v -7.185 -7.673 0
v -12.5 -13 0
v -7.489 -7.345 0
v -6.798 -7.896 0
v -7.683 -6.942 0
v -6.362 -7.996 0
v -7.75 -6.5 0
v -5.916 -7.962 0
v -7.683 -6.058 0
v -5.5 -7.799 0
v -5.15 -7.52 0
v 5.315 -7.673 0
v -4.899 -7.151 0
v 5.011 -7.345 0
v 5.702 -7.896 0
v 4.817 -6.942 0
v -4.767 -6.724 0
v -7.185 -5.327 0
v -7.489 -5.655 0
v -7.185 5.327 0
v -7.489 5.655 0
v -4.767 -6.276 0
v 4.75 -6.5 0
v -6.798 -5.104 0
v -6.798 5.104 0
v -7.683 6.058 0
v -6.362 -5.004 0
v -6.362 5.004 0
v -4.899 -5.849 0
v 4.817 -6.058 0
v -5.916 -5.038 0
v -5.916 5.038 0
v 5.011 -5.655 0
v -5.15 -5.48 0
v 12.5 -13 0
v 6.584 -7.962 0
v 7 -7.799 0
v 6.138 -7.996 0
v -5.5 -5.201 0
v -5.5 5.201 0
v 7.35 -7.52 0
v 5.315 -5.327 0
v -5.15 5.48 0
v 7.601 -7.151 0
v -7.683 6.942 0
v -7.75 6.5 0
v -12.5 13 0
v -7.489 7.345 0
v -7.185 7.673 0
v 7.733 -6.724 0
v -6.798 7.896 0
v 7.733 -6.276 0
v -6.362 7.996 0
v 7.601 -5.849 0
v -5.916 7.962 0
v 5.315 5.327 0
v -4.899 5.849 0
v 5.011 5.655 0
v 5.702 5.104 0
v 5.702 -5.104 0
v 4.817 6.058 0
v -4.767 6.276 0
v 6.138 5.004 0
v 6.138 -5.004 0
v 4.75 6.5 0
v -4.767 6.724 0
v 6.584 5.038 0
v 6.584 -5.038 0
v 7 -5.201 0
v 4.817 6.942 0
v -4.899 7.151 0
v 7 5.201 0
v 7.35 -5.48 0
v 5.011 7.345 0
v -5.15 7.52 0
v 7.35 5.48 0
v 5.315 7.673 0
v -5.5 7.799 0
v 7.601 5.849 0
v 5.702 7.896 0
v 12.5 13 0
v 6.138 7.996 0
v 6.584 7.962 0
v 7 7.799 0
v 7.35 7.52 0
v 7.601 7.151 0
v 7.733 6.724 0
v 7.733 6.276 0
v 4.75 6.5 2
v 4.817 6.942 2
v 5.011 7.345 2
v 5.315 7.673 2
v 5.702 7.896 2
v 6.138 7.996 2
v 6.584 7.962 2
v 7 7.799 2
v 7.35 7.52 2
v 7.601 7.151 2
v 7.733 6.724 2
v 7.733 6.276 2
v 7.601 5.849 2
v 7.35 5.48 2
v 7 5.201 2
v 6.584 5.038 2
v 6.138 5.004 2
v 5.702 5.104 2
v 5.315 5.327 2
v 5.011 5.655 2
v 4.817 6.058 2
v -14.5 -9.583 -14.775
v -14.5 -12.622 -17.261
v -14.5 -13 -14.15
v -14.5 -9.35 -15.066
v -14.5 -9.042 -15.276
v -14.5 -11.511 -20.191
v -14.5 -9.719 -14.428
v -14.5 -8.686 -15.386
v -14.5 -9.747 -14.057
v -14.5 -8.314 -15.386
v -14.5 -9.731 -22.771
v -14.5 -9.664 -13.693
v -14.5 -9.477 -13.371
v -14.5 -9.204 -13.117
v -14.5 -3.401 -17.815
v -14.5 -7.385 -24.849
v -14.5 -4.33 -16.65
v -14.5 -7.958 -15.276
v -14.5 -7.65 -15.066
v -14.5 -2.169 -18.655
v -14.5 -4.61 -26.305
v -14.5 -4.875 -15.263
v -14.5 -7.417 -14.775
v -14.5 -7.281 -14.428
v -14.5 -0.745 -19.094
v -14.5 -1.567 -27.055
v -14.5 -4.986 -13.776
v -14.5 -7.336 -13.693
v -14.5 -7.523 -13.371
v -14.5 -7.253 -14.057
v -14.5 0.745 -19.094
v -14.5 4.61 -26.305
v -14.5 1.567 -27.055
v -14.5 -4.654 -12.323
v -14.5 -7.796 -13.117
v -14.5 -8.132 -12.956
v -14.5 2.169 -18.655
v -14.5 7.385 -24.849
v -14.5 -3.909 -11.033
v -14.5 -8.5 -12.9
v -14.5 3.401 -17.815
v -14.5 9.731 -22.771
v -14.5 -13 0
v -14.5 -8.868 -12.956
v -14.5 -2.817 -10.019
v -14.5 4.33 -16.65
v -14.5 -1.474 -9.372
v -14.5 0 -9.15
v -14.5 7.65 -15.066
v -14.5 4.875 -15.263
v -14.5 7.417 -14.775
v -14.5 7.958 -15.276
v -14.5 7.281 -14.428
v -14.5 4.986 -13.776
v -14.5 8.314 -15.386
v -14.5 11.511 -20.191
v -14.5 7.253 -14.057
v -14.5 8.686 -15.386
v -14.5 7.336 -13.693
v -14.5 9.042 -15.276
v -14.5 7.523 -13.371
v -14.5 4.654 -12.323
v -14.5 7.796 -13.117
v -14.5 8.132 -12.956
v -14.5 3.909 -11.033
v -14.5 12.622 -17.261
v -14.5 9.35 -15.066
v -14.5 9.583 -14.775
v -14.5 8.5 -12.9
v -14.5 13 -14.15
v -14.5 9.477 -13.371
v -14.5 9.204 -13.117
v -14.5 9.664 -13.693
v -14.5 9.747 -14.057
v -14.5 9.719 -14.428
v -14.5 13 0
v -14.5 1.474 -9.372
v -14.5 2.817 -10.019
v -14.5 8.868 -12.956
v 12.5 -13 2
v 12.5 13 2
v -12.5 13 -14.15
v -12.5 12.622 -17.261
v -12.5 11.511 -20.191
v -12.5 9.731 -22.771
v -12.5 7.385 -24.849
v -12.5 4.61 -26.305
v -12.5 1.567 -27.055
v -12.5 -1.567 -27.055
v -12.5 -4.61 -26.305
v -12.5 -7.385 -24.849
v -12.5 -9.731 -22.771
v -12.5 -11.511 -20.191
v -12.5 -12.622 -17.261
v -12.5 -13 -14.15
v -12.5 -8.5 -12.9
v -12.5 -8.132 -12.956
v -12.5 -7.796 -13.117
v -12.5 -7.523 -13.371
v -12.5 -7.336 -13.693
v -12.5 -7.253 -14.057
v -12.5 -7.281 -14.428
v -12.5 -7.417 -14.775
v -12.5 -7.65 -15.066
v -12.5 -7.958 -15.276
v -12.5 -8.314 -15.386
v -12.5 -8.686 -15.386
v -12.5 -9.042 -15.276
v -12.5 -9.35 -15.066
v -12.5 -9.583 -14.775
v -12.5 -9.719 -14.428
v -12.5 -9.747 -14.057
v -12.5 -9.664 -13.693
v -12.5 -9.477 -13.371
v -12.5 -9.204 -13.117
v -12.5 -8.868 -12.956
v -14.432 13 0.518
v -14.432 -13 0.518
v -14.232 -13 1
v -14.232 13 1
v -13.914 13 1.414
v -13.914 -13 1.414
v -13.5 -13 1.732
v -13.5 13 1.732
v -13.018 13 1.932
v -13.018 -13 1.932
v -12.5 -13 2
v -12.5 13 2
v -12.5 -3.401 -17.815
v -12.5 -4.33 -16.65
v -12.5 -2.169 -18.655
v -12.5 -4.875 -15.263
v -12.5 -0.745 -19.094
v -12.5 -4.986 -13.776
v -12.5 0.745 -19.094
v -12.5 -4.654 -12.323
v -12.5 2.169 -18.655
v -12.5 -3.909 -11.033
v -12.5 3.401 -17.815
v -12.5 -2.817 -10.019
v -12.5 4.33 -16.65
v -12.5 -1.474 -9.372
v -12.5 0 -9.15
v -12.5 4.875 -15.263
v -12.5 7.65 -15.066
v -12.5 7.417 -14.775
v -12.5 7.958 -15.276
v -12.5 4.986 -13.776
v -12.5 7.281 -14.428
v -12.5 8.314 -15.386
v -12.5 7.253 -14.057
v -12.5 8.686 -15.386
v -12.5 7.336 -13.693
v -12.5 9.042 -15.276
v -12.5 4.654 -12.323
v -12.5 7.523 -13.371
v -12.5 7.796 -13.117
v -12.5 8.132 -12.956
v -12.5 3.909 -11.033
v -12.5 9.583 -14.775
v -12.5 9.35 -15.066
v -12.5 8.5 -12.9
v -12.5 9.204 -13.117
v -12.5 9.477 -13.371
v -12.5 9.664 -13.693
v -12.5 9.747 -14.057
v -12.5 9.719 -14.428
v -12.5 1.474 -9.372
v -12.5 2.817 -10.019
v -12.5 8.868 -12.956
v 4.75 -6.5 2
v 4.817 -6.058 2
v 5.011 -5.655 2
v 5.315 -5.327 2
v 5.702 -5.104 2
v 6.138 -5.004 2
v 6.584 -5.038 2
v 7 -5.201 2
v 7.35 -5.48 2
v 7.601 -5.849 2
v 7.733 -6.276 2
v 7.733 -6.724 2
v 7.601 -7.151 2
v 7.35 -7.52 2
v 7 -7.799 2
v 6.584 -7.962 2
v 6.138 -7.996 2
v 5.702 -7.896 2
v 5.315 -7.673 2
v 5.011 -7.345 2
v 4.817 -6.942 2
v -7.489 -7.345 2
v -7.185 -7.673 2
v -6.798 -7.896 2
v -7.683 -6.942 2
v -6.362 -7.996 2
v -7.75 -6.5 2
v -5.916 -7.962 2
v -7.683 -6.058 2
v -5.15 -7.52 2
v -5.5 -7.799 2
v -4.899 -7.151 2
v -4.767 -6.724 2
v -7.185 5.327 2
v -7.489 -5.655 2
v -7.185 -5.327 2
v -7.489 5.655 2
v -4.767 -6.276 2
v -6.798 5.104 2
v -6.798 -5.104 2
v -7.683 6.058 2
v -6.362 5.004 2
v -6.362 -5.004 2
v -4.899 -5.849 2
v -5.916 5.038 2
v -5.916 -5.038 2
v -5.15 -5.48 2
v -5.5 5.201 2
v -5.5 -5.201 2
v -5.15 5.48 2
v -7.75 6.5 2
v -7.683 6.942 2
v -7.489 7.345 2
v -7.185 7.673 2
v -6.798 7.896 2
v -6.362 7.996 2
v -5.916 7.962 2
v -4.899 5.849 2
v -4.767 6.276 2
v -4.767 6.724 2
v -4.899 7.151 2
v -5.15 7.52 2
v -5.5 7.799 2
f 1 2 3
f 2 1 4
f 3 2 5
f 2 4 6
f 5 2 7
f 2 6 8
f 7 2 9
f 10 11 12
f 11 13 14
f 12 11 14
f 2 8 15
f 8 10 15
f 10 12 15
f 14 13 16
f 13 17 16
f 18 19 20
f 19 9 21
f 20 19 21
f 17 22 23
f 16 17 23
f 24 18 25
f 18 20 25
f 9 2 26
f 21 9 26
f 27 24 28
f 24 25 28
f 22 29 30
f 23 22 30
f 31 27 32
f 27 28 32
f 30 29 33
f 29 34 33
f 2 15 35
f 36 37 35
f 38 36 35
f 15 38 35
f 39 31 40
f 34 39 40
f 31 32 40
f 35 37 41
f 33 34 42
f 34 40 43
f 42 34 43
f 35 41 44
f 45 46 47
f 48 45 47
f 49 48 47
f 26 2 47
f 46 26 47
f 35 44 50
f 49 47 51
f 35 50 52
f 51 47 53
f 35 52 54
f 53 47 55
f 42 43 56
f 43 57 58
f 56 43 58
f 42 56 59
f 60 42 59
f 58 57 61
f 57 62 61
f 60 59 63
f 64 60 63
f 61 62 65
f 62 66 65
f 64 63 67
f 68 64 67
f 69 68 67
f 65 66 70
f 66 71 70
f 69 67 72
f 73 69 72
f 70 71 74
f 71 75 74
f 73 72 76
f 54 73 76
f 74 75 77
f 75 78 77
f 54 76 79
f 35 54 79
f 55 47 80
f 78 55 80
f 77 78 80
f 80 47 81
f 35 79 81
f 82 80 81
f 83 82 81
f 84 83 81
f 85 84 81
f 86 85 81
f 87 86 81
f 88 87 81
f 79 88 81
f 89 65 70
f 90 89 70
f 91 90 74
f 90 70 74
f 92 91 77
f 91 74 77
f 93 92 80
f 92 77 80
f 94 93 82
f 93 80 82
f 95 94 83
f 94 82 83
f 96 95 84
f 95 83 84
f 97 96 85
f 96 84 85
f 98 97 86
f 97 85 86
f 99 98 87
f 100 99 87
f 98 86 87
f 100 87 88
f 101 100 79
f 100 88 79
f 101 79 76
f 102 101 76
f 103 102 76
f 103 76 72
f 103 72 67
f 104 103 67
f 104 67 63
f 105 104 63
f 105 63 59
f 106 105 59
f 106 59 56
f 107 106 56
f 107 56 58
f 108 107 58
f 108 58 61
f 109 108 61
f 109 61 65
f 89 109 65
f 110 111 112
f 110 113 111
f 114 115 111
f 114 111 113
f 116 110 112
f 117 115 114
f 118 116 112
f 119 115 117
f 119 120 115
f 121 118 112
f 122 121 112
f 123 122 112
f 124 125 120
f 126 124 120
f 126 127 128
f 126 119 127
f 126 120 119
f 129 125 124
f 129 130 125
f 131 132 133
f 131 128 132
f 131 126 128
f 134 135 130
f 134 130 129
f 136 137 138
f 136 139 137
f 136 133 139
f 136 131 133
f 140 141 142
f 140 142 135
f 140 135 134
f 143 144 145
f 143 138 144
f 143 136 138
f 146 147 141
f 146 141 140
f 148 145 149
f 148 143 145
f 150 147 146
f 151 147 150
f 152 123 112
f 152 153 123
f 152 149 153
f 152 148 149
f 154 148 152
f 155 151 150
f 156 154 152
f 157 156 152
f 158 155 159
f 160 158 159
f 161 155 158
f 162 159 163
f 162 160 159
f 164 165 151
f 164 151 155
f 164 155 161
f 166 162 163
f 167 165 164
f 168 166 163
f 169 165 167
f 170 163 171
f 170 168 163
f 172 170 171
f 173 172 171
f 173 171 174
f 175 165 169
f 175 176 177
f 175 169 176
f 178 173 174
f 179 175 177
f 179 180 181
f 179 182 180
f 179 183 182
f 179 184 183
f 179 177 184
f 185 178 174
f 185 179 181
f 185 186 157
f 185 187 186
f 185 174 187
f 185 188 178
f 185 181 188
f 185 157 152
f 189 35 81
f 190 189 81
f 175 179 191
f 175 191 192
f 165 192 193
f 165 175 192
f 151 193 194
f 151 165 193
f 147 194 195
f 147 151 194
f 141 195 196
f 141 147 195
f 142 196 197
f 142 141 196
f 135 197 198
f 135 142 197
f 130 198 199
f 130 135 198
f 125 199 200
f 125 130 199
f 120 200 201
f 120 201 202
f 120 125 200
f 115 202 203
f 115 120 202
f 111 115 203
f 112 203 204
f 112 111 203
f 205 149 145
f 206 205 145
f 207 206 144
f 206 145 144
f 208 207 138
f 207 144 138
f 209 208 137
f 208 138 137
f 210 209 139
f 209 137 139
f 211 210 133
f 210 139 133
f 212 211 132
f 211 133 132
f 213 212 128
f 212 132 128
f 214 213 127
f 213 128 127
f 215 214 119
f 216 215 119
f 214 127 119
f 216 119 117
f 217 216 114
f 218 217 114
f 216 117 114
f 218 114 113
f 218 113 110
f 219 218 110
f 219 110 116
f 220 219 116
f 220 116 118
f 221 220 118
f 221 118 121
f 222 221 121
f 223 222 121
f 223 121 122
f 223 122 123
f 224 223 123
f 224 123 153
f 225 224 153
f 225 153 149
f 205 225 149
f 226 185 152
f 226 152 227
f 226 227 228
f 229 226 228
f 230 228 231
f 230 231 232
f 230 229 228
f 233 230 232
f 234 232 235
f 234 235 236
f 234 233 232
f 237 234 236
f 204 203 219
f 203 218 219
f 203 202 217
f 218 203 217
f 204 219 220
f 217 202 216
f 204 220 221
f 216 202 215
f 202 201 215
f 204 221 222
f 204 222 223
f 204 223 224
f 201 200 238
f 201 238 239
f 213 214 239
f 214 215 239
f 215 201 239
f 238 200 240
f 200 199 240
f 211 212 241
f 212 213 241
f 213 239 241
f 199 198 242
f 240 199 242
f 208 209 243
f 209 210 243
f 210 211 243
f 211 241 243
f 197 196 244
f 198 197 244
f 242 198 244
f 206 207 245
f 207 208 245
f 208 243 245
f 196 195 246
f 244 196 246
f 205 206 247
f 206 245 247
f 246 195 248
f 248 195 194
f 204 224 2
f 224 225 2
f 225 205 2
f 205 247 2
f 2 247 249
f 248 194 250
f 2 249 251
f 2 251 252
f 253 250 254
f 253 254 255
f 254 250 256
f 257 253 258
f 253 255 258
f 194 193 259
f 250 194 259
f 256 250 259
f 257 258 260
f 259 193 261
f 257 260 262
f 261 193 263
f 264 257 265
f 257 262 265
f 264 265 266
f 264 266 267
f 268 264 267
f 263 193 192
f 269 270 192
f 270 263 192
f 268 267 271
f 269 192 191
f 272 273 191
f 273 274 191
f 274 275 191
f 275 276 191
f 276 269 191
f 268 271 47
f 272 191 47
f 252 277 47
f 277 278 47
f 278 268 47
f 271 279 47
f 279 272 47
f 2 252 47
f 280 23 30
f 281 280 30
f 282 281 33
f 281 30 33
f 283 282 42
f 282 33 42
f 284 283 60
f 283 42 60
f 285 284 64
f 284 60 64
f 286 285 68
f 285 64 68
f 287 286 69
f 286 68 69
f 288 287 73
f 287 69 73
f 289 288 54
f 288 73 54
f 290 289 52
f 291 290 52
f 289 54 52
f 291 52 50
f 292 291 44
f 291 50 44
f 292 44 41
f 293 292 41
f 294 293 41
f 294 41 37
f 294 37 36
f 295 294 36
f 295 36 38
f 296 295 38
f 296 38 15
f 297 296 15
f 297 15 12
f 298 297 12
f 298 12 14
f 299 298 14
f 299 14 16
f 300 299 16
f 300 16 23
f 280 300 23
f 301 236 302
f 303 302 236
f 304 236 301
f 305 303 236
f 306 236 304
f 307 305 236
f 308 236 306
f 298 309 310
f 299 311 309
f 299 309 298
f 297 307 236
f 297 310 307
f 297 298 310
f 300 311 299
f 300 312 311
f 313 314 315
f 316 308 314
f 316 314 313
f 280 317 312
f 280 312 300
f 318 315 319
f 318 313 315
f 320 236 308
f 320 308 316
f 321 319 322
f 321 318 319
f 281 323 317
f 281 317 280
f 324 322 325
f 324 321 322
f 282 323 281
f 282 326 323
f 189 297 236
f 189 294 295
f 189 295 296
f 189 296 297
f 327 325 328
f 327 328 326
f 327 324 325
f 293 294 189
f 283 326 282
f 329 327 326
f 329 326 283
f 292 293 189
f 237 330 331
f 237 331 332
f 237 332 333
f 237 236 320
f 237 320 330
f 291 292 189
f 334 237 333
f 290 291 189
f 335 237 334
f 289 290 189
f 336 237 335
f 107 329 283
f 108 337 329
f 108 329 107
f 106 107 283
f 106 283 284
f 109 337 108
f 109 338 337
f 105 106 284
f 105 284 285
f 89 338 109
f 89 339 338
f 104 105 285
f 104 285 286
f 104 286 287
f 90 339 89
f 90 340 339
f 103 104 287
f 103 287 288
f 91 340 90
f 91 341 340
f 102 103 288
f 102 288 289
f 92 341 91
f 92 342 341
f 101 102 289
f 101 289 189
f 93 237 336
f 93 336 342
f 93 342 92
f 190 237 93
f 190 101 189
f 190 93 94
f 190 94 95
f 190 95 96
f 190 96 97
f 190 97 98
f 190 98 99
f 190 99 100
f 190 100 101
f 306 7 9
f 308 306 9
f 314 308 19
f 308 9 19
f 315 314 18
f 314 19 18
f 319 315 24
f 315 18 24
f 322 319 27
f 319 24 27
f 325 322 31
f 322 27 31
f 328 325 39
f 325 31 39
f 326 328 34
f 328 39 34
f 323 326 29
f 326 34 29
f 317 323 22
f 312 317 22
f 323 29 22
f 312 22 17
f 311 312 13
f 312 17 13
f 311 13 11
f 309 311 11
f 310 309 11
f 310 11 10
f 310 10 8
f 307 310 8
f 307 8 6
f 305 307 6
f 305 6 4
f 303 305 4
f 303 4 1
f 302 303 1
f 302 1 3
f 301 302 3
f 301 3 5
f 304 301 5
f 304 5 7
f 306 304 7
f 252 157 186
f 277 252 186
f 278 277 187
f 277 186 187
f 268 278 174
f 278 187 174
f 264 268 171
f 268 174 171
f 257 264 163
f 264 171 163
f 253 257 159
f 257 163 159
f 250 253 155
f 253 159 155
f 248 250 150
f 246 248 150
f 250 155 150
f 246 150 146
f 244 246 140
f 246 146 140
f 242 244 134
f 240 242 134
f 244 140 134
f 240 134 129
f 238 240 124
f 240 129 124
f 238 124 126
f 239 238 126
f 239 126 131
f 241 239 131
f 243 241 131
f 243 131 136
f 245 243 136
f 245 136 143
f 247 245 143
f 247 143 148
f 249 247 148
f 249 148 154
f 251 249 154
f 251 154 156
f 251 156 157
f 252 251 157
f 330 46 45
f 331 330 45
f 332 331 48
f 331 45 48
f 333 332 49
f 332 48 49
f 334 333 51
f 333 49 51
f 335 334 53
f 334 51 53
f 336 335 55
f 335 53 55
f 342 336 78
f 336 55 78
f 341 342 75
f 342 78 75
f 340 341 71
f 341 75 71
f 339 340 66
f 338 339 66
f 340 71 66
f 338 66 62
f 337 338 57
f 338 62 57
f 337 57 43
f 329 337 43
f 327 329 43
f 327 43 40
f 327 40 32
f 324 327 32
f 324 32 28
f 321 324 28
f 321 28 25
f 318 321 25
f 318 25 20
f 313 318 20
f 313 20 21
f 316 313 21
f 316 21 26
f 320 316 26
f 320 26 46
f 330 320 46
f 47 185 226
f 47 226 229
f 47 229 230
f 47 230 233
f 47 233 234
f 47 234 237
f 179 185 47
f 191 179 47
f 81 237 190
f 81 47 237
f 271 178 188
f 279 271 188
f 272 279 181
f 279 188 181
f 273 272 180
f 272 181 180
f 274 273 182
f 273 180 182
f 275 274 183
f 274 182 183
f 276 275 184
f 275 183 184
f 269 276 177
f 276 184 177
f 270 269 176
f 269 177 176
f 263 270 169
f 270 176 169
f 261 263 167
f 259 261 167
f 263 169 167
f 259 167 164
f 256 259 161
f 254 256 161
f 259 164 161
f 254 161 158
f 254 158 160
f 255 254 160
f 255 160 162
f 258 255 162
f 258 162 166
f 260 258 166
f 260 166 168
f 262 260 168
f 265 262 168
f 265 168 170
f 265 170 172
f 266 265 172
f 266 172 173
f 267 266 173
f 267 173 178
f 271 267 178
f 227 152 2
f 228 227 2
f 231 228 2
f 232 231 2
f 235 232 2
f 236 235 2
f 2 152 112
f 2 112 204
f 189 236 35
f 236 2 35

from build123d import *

# Parameters (mm, degrees)
ESQUISSE1_W             = 25
ESQUISSE1_H             = 26
ESQUISSE1_R             = 1.5
BOSS_EXTRU_1_DEPTH      = 2
BOSS_EXTRU_2_DEPTH      = 26
BOSS_EXTRU_3_DEPTH      = 2
ESQUISSE7_R             = 1.5
ENL_V_MAT_EXTRU_1_DEPTH = 3
ESQUISSE6_R             = 5
ENL_V_MAT_EXTRU_2_DEPTH = 28
ESQUISSE8_R             = 1.25
ENL_V_MAT_EXTRU_3_DEPTH = 28


with BuildPart() as part:
    # Esquisse1 → Boss.-Extru.1 (new body)
    with BuildSketch(Plane.XY):
        Rectangle(ESQUISSE1_W, ESQUISSE1_H)
        with Locations((-6.25, 6.5)):
            Circle(ESQUISSE1_R, mode=Mode.SUBTRACT)
        with Locations((6.25, 6.5)):
            Circle(ESQUISSE1_R, mode=Mode.SUBTRACT)
        with Locations((6.25, -6.5)):
            Circle(ESQUISSE1_R, mode=Mode.SUBTRACT)
        with Locations((-6.25, -6.5)):
            Circle(ESQUISSE1_R, mode=Mode.SUBTRACT)
    extrude(amount=BOSS_EXTRU_1_DEPTH)

    # Esquisse2 → Boss.-Extru.2 (add)
    with BuildSketch(Plane(origin=(0, 13, 0), x_dir=(1, 0, 0), z_dir=(0, 1, 0))):
        with BuildLine():
            Line((-12.5, -2), (12.5, -2))
            Line((12.5, -2), (12.5, 0))
            Line((12.5, 0), (-12.5, 0))
            Line((-12.5, 0), (-12.5, 14.15))
            Line((-12.5, 14.15), (-14.5, 14.15))
            Line((-14.5, 14.15), (-14.5, 0))
            ThreePointArc((-14.5, 0), (-13.914213562, -1.414213562), (-12.5, -2))
        make_face()
    extrude(amount=-BOSS_EXTRU_2_DEPTH)

    # Esquisse5 → Boss.-Extru.3 (add)
    with BuildSketch(Plane.ZY.offset(14.5)):
        with BuildLine():
            Line((-14.15, -13), (-14.15, 13))
            ThreePointArc((-14.15, 13), (-27.15, 0), (-14.15, -13))
        make_face()
    extrude(amount=-BOSS_EXTRU_3_DEPTH)

    # Esquisse7 → Enlèv. mat.-Extru.1 (cut, through all)
    with BuildSketch(Plane(origin=(0, 0, 0), x_dir=(-1, 0, 0), z_dir=(0, 0, -1))):
        with Locations((-6.25, -6.5)):
            Circle(ESQUISSE7_R)
        with Locations((6.25, -6.5)):
            Circle(ESQUISSE7_R)
        with Locations((6.25, 6.5)):
            Circle(ESQUISSE7_R)
        with Locations((-6.25, 6.5)):
            Circle(ESQUISSE7_R)
    extrude(amount=-ENL_V_MAT_EXTRU_1_DEPTH, mode=Mode.SUBTRACT)

    # Esquisse6 → Enlèv. mat.-Extru.2 (cut, through all)
    with BuildSketch(Plane.ZY.offset(14.5)):
        with Locations((-14.15, 0)):
            Circle(ESQUISSE6_R)
    extrude(amount=-ENL_V_MAT_EXTRU_2_DEPTH, mode=Mode.SUBTRACT)

    # Esquisse8 → Enlèv. mat.-Extru.3 (cut, through all)
    with BuildSketch(Plane.ZY.offset(14.5)):
        with Locations((-14.15, 8.5)):
            Circle(ESQUISSE8_R)
        with Locations((-14.15, -8.5)):
            Circle(ESQUISSE8_R)
    extrude(amount=-ENL_V_MAT_EXTRU_3_DEPTH, mode=Mode.SUBTRACT)


solid = part.part
